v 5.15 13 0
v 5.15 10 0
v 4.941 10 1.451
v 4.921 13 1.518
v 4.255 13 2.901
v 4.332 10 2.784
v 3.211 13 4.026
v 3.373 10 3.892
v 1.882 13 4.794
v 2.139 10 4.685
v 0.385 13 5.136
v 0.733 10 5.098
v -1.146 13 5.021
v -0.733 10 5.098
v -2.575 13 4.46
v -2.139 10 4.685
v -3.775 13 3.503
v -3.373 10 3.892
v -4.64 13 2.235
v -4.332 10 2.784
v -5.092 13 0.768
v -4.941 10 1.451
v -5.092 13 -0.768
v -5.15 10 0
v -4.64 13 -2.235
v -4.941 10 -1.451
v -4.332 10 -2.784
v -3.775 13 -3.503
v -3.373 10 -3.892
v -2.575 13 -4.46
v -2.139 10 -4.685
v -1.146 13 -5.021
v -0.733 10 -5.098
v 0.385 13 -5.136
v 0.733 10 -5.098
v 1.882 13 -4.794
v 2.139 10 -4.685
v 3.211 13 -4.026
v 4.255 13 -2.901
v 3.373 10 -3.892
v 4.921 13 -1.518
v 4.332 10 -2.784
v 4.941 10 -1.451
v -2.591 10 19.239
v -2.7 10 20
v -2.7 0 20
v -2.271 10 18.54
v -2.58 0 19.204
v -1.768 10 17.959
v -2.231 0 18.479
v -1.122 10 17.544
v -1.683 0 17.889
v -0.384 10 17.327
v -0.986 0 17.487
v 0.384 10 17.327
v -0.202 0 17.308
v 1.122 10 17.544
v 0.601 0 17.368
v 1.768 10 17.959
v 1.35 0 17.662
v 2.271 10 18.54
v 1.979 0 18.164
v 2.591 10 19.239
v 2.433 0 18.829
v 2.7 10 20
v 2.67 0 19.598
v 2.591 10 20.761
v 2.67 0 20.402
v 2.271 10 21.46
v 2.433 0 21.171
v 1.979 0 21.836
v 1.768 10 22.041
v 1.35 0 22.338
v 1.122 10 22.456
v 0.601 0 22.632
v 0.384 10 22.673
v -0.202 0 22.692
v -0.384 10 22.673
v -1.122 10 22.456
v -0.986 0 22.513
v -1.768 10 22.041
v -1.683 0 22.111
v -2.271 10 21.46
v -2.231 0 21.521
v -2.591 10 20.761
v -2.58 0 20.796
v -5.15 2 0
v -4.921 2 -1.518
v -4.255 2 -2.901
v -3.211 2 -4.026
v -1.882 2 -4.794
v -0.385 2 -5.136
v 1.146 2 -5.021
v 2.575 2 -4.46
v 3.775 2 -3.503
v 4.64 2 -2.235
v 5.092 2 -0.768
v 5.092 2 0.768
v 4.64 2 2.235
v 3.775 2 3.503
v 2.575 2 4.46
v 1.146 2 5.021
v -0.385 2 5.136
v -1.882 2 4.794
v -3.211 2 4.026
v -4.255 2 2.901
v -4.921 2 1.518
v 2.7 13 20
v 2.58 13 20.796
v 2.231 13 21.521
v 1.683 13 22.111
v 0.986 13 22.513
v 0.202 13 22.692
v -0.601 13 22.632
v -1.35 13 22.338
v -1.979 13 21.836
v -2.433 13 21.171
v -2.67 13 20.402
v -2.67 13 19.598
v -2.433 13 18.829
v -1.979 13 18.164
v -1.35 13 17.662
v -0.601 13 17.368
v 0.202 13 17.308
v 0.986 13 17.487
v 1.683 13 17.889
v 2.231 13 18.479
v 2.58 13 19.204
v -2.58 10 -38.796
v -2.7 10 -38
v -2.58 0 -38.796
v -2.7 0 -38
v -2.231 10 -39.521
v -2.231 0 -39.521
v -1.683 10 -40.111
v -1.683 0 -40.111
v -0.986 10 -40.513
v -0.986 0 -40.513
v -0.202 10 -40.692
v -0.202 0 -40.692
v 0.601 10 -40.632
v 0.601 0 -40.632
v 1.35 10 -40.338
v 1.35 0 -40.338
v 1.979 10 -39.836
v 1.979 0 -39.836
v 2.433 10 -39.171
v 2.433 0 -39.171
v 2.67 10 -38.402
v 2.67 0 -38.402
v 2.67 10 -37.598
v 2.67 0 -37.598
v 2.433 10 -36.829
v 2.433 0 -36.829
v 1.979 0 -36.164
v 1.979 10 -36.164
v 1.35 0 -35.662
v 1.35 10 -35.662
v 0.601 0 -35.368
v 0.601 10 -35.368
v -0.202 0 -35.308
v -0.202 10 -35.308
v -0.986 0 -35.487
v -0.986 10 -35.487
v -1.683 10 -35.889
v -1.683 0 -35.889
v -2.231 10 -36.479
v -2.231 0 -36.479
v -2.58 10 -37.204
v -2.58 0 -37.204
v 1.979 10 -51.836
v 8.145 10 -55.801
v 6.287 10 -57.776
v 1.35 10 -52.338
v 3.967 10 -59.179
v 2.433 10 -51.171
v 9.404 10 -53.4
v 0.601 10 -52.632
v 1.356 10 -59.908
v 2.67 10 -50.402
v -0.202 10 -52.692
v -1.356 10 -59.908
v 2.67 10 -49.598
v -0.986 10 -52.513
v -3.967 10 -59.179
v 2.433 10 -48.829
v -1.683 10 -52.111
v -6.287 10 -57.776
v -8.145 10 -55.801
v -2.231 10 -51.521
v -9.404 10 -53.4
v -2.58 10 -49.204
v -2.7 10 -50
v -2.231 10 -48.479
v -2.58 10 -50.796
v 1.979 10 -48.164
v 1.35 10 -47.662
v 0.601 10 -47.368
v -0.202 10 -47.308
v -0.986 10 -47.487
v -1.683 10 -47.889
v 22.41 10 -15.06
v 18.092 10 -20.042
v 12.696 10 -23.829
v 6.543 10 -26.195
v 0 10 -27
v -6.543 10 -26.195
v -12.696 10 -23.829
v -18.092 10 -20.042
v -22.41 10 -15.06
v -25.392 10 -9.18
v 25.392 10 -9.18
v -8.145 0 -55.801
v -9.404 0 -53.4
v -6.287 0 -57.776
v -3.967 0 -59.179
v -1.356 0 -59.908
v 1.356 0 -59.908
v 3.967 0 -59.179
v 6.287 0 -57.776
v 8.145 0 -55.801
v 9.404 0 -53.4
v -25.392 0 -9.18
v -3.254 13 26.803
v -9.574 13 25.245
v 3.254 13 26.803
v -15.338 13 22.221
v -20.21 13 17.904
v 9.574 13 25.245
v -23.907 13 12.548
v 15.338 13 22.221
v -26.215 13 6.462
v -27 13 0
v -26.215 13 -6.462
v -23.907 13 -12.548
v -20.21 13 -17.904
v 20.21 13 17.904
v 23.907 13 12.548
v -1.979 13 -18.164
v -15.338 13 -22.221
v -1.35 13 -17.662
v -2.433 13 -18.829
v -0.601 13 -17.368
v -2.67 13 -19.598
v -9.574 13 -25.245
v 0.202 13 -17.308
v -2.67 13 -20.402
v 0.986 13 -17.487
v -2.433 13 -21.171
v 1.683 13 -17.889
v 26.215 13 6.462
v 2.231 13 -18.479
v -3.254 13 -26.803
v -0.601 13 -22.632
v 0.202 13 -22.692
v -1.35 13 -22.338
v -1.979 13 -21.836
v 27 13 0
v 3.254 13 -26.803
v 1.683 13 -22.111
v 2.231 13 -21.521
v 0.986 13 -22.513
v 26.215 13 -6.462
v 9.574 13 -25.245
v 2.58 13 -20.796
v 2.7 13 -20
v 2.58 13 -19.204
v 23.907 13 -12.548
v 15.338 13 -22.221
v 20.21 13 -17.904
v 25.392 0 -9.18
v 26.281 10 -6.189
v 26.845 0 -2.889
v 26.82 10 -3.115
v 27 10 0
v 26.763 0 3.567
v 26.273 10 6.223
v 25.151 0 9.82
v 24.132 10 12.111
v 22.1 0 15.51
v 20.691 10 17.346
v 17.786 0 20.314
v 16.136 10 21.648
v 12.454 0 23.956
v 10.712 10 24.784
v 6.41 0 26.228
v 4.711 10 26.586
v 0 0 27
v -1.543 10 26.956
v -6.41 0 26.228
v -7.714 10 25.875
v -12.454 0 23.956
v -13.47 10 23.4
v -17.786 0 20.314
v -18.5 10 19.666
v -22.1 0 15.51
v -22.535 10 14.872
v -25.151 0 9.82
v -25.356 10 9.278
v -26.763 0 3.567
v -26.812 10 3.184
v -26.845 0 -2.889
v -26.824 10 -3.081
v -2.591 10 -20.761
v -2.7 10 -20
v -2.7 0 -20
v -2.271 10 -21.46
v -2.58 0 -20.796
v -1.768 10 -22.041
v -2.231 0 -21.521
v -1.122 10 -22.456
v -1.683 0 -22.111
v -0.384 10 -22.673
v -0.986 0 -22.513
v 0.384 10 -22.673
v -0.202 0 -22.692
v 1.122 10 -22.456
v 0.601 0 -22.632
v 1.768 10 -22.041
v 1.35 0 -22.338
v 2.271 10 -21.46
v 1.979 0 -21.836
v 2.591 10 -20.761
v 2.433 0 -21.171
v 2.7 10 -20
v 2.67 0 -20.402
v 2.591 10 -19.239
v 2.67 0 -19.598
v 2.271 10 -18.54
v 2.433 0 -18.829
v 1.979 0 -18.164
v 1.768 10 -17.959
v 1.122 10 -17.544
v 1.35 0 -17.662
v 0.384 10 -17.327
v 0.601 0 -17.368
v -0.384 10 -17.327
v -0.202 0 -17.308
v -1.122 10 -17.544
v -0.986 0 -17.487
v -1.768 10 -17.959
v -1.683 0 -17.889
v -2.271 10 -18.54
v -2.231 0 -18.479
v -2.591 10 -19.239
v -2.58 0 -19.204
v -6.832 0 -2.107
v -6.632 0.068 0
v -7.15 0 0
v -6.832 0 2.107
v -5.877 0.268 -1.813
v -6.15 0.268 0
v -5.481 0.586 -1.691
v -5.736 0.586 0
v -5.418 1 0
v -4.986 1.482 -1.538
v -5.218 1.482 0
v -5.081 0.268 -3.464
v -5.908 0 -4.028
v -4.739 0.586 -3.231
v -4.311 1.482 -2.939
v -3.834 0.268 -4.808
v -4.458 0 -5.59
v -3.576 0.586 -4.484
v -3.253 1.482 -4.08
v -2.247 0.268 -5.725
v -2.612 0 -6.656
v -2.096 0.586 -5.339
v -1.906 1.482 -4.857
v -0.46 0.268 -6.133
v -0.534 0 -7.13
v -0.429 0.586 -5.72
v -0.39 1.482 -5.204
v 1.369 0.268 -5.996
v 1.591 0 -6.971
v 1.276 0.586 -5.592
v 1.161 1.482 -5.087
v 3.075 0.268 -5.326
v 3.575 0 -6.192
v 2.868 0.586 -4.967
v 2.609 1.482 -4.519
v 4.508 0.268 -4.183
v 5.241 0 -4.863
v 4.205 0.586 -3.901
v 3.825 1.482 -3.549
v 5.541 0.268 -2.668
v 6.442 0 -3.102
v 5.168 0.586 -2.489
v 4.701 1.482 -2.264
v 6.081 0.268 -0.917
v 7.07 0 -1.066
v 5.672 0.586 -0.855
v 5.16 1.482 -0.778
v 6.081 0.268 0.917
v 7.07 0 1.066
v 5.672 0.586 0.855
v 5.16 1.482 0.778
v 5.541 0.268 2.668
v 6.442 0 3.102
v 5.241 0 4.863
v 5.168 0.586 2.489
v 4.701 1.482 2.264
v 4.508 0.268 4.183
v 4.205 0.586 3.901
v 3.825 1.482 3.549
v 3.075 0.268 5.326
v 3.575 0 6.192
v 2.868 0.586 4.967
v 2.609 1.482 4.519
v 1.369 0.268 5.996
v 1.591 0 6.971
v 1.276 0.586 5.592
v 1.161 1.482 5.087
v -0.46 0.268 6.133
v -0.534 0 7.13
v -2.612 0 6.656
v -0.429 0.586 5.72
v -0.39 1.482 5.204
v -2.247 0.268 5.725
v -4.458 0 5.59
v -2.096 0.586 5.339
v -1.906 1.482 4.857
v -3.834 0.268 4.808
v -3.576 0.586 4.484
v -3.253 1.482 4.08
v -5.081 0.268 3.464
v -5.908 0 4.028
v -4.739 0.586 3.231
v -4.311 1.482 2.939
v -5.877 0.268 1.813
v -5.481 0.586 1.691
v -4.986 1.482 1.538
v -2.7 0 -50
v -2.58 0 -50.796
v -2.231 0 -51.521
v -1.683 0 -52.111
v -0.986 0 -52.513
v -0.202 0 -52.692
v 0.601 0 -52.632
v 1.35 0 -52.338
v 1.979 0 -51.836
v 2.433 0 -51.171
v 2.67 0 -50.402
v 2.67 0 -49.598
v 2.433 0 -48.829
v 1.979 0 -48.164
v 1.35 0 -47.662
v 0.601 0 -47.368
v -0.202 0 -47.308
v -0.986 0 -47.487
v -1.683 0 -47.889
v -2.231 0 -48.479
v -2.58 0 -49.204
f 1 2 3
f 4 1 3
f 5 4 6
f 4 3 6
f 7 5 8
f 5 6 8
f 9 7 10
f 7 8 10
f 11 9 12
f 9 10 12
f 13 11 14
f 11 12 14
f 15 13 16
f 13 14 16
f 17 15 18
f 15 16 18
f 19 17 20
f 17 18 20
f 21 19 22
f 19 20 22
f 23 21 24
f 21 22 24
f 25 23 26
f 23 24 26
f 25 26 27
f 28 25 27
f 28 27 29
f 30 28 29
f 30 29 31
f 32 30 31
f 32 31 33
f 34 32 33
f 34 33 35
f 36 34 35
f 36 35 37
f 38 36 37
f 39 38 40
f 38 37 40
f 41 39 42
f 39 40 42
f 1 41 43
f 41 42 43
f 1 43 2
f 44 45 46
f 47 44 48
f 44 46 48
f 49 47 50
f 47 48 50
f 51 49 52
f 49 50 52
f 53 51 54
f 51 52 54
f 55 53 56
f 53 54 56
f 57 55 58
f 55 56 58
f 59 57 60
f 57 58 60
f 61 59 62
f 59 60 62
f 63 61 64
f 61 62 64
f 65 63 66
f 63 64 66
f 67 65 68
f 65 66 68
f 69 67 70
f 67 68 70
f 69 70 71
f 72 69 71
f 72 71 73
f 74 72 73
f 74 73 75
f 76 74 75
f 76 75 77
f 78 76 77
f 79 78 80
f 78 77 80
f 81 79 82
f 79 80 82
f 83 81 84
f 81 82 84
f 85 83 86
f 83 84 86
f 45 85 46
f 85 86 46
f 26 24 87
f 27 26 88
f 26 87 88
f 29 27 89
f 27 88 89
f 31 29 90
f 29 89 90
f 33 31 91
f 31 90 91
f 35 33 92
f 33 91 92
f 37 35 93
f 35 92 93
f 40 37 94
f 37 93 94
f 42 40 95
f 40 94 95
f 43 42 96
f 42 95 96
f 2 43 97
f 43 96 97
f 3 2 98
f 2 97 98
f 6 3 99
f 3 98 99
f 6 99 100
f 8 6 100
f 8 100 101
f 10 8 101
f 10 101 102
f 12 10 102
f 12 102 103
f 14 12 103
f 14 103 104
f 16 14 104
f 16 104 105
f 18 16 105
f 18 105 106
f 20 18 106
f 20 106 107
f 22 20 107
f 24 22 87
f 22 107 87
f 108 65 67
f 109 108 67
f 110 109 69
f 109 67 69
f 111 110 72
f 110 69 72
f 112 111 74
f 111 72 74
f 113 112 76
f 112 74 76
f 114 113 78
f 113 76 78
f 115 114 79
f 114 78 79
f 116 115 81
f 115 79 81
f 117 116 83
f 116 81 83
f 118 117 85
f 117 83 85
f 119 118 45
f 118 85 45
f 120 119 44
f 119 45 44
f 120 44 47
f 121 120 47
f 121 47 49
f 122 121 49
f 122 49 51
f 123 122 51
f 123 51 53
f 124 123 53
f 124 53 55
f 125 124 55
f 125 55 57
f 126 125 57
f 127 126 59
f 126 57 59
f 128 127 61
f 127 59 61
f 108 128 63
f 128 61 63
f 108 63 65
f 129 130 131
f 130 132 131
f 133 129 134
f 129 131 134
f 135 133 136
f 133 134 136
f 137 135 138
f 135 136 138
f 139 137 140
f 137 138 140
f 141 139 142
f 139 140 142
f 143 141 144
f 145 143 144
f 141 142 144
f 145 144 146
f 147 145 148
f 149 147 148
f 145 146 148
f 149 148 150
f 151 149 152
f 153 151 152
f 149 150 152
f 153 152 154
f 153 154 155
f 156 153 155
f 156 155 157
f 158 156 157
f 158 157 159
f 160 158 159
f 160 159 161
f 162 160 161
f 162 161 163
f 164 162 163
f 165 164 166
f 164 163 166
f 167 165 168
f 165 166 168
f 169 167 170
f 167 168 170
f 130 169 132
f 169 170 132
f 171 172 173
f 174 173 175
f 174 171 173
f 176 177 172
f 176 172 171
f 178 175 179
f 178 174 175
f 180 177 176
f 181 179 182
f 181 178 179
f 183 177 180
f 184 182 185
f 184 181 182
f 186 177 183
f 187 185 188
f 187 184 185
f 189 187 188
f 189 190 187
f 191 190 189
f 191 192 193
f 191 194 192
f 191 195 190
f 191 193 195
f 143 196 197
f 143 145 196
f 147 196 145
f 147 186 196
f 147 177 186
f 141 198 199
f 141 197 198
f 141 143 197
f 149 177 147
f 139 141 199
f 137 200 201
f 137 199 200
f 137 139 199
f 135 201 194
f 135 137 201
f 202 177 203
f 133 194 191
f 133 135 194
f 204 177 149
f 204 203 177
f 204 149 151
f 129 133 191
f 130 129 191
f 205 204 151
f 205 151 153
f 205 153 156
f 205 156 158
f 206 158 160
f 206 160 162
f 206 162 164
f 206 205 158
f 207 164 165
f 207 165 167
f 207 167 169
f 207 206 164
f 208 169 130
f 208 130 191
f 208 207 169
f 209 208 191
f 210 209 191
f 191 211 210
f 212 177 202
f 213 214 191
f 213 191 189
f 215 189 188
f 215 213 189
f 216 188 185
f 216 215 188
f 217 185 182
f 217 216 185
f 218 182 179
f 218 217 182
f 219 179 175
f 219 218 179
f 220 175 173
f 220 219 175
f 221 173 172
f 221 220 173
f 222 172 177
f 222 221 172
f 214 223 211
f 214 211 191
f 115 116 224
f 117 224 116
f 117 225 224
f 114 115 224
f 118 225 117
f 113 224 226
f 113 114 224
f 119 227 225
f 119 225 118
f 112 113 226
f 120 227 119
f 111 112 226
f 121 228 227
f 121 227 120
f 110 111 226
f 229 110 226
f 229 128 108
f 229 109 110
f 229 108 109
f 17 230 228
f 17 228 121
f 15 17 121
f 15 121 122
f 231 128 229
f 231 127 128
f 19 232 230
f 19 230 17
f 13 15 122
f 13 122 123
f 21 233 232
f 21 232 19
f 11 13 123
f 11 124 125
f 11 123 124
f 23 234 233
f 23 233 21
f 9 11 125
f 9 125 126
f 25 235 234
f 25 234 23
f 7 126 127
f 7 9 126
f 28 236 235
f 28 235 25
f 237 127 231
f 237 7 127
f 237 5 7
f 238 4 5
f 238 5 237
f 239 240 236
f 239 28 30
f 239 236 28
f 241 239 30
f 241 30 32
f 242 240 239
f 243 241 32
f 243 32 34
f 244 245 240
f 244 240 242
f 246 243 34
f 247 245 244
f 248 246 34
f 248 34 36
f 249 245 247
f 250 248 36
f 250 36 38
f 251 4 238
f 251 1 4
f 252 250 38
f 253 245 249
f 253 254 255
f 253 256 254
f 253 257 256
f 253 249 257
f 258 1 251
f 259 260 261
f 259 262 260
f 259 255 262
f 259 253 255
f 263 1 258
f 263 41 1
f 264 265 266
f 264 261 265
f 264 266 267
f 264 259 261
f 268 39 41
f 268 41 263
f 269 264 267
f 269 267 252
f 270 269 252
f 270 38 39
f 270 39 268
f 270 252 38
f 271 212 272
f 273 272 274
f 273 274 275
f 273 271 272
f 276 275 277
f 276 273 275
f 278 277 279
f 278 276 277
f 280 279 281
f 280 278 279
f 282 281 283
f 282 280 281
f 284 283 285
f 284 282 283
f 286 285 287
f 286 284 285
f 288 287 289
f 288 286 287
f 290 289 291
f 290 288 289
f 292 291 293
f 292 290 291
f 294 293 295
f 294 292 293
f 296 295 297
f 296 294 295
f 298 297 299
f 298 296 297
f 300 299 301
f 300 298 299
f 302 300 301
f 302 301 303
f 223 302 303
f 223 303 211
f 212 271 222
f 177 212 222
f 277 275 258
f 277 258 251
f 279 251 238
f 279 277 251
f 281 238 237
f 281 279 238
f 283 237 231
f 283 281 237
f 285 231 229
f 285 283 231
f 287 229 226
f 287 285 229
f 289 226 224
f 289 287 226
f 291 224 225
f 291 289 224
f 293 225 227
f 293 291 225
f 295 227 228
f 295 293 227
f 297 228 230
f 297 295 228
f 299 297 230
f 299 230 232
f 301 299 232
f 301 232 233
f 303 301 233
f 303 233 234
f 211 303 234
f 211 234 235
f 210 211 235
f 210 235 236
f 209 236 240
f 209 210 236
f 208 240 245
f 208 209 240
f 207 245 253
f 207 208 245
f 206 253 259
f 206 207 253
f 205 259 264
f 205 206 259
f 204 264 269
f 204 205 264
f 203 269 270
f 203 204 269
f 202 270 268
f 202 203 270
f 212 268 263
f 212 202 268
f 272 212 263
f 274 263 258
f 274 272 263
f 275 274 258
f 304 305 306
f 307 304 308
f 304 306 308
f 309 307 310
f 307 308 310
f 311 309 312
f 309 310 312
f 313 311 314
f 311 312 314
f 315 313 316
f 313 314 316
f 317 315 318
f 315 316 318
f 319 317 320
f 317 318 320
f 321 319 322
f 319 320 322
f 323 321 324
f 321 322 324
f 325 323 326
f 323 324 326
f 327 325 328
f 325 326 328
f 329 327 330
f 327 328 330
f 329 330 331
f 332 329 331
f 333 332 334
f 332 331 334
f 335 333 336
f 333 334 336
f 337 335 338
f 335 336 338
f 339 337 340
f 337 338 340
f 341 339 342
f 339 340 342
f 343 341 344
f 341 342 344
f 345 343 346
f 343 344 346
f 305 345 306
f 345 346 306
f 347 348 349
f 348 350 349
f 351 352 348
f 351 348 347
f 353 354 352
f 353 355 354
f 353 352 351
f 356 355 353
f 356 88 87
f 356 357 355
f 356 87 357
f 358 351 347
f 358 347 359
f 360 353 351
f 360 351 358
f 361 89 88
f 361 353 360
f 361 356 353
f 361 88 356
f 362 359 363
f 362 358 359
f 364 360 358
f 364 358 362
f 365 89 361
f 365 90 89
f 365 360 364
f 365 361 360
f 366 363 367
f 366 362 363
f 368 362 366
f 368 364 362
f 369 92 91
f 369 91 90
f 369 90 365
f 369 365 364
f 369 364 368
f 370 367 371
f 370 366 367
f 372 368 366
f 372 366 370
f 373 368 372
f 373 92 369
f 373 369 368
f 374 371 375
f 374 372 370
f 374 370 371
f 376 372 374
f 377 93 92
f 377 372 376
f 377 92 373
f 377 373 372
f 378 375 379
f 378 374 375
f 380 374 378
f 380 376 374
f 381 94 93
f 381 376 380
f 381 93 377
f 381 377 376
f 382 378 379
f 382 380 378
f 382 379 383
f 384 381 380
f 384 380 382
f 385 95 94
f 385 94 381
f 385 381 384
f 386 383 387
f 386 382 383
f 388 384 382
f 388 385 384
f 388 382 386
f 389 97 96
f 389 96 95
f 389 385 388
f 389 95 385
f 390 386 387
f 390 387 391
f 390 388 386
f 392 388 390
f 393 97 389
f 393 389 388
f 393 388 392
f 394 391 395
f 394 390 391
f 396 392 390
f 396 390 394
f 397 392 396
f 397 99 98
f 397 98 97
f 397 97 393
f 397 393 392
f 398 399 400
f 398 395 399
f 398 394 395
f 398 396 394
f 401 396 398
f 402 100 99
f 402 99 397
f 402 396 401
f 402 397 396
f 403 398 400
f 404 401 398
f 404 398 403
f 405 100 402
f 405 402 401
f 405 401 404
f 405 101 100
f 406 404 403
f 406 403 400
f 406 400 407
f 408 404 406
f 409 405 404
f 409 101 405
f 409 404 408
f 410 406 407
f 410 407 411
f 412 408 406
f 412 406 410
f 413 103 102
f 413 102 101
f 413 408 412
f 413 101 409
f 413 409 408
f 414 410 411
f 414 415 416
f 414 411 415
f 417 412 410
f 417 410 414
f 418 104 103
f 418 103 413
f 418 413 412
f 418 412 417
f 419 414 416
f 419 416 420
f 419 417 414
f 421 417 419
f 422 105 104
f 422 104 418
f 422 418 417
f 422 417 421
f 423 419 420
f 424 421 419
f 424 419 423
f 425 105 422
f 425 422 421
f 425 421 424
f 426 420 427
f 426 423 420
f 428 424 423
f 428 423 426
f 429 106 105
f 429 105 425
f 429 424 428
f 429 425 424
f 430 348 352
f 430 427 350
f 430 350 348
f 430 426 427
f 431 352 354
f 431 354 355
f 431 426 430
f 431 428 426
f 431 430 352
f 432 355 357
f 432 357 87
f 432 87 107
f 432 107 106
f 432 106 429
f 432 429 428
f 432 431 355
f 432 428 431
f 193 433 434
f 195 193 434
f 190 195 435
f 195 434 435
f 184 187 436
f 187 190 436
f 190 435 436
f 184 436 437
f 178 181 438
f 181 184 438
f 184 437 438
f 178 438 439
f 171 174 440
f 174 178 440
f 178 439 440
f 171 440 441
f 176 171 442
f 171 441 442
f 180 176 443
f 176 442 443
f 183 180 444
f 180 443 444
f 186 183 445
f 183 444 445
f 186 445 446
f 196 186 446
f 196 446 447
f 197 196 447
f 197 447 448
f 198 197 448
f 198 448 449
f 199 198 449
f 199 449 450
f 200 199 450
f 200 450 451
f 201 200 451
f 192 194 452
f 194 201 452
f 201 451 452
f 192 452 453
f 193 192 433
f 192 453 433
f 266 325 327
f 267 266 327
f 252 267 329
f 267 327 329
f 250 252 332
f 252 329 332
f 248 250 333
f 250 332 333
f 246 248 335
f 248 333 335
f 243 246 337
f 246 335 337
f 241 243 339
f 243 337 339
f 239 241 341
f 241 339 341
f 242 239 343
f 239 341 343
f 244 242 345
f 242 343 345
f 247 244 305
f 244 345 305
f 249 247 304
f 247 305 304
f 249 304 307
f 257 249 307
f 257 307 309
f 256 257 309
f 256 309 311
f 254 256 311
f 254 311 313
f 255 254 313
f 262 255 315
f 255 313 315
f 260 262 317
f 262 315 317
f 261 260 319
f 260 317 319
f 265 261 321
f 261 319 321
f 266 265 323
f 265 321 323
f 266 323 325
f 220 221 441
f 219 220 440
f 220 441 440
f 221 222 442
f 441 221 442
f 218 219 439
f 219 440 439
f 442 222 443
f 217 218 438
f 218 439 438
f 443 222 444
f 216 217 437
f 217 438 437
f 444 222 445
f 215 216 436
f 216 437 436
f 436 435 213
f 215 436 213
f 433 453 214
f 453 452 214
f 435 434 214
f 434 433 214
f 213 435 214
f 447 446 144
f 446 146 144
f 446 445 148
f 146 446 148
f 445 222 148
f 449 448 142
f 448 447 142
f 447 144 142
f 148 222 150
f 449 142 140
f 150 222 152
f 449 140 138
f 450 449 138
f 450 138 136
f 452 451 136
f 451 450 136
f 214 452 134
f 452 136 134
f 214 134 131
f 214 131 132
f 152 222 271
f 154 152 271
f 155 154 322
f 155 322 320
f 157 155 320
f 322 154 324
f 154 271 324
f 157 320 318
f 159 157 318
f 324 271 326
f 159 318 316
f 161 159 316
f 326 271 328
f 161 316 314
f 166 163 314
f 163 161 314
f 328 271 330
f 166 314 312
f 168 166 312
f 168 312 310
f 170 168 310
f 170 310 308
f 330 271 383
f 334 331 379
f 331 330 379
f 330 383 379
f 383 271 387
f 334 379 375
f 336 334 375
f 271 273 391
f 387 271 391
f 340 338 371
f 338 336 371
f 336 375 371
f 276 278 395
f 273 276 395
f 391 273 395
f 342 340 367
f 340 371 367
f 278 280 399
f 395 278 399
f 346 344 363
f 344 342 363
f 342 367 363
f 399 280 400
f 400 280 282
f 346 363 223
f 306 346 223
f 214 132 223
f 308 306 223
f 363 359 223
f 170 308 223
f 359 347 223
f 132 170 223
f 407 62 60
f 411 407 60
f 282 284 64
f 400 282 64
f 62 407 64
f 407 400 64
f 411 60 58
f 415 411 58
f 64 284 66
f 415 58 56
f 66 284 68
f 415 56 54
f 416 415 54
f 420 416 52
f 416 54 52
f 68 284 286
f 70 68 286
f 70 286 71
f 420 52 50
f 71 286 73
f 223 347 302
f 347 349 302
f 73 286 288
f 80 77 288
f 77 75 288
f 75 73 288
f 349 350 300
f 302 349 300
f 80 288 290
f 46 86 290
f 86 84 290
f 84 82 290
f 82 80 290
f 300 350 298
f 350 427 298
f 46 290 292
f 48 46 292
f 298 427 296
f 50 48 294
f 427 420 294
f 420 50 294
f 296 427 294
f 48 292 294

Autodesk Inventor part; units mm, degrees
ref_plane "YZ Plane" through (0, 0, 0) normal (1, 0, 0) x (0, 1, 0)
ref_plane "XZ Plane" through (0, 0, 0) normal (0, 1, 0) x (-1, 0, 0)
ref_plane "XY Plane" through (0, 0, 0) normal (0, 0, 1) x (1, 0, 0)
sketch "Boceto1" plane through (0, 0, 0) normal (0, 1, 0) x (-1, 0, 0)
  circle A0 centre (0, 0) radius 27
  circle A1 centre (0, -50) radius 10
  circle A2 centre (0, 0) radius 5.15
  line L0 (25.3915, -9.18) -> (9.4043, -53.4)
  line L1 (-25.3915, -9.18) -> (-9.4043, -53.4)
  circle A3 centre (0, -50) radius 2.7
  circle A4 centre (0, -38) radius 2.7
  circle A5 centre (0, -20) radius 2.7
  circle A6 centre (0, 20) radius 2.7
  dimension "d0" = 10.3
  dimension "d1" = 5.4
  dimension "d2" = 5.4
  dimension "d3" = 12
  dimension "d4" = 50
  dimension "d5" = 20
  dimension "d6" = 54
  dimension "d10" = 5.4
  dimension "d11" = 5.4
  dimension "d12" = 20
  dimension "d13" = 20
extrude "Extrusión1" add sketch "Boceto1" along normal blind 10 contours A0 | A0 L0 A1 A4 L1 | A1 A4 picked at (1.999, -42.9031)
sketch "Boceto3" plane through (0, 10, 0) normal (0, 1, 0) x (1, 0, 0)
  circle A0 centre (0, 0) radius 27
  circle A1 centre (0, -20) radius 2.7 projected
  circle A2 centre (0, 0) radius 5.15 projected
  circle A3 centre (0, 20) radius 2.7 projected
extrude "Extrusión2" add sketch "Boceto3" along normal blind 3
fillet "Empalme1" radius 2 1 edges at (5.15, 0, 0)
properties part number "Beam support"
